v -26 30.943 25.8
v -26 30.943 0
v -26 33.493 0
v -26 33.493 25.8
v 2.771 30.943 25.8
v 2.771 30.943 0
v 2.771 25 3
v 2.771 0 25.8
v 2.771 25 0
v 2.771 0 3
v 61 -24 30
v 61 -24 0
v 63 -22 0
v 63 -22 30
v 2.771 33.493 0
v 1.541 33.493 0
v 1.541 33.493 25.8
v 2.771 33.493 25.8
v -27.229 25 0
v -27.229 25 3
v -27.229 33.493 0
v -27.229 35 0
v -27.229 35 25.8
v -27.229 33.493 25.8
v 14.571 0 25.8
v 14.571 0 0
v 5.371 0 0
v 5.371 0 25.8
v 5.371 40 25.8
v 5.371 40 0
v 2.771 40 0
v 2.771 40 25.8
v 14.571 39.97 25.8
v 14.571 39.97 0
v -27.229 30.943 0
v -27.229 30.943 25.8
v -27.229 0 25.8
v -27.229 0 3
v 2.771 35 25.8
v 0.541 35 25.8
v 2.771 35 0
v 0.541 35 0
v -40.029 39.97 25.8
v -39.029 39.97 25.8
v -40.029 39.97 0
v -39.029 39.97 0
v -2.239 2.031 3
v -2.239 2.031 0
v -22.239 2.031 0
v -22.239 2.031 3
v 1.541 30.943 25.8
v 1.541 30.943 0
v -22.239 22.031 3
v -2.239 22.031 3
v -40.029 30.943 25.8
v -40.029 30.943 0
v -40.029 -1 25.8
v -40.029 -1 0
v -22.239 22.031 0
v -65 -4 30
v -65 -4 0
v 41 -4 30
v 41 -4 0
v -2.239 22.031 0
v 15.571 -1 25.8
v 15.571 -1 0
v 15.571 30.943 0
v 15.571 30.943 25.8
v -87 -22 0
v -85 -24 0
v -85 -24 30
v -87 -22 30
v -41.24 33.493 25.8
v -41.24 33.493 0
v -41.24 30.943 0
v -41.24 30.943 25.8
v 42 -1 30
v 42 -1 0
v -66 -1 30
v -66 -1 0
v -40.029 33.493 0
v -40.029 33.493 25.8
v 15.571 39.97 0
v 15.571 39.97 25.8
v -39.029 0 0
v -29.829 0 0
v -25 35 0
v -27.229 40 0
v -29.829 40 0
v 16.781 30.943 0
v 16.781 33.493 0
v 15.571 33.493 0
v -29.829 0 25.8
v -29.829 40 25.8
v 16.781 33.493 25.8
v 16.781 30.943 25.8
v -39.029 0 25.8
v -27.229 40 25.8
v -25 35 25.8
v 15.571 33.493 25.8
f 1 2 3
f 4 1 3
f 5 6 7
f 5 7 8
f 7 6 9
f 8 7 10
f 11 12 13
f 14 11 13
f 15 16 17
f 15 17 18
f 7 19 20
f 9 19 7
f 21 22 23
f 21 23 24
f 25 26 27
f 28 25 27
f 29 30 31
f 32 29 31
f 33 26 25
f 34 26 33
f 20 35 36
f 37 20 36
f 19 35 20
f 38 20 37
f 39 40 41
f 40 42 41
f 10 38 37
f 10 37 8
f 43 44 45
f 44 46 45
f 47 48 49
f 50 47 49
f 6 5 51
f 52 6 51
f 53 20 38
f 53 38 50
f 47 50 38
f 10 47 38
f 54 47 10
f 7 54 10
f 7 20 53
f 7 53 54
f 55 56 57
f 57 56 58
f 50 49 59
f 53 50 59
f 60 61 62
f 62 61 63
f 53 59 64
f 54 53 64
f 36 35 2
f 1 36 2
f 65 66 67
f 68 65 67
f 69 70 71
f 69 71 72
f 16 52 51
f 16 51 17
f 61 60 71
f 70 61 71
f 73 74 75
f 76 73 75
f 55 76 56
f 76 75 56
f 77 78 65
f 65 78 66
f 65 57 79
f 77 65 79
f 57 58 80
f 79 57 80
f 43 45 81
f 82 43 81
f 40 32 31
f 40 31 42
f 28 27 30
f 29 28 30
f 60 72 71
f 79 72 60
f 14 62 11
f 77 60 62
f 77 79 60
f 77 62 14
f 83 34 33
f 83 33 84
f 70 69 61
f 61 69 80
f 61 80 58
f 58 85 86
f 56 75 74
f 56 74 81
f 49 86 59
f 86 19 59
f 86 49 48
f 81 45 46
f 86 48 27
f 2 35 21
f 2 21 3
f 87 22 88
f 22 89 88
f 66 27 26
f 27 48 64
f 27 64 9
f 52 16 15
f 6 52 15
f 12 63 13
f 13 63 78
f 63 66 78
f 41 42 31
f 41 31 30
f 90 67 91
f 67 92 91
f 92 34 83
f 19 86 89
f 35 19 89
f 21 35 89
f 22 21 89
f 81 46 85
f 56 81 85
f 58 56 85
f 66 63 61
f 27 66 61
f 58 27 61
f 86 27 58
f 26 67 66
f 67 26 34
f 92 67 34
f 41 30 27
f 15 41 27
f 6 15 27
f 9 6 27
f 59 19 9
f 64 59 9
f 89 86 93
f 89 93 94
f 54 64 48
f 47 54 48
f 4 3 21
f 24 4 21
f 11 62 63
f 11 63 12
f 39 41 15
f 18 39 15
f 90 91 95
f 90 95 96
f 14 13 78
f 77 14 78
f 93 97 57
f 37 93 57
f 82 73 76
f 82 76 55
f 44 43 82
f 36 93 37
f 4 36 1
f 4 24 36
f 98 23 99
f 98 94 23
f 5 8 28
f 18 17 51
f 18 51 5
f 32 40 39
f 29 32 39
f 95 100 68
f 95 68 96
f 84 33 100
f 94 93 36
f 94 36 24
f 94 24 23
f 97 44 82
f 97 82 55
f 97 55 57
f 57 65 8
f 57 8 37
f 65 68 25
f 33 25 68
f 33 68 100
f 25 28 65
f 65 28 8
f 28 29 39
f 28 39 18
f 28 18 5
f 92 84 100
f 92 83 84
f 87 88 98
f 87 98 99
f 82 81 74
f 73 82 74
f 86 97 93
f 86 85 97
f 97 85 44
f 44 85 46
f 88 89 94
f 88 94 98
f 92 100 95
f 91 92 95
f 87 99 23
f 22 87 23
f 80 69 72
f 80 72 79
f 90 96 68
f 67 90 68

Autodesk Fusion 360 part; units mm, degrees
sketch "スケッチ1" plane through (0, 0, 0) normal (0, 0, 1) x (1, 0, 0)
  line L0 (-40.0294, 0) -> (-27.2294, 0)
  line L1 (-27.2294, 0) -> (-27.2294, -2.8335)
  line L2 (-27.2294, -2.8335) -> (-40.0294, -2.8335)
  line L3 (-40.0294, -2.8335) -> (-40.0294, 0)
  line L4 (-40.0294, 0) -> (-39.0294, 0)
  line L5 (-39.0294, 0) -> (-39.0294, 39.9696)
  line L6 (-39.0294, 39.9696) -> (-40.0294, 39.9696)
  line L7 (-40.0294, 39.9696) -> (-40.0294, 0)
  line L8 (-27.2294, 0) -> (-28.3294, 0)
  line L9 (-28.3294, 0) -> (-28.3294, 40)
  line L10 (-28.3294, 40) -> (-27.2294, 40)
  line L11 (-27.2294, 40) -> (-27.2294, 0)
  line L12 (-27.2294, 0) -> (2.7706, 0)
  line L13 (2.7706, 0) -> (2.7706, -2.9213)
  line L14 (2.7706, -2.9213) -> (-27.2294, -2.9213)
  line L15 (-27.2294, -2.9213) -> (-27.2294, 0)
  line L16 (-12.2294, 0) -> (-12.2294, -2.9213)
  line L17 (2.7706, 0) -> (2.7706, -2.8335)
  line L18 (15.5706, 0) -> (2.7706, 0)
  line L19 (15.5706, 39.9696) -> (15.5706, 0)
  line L20 (3.8706, 0) -> (3.8706, 40)
  line L21 (14.5706, 39.9696) -> (15.5706, 39.9696)
  line L22 (15.5706, 0) -> (14.5706, 0)
  line L23 (14.5706, 0) -> (14.5706, 39.9696)
  line L24 (15.5706, -2.8335) -> (15.5706, 0)
  line L25 (2.7706, -2.9213) -> (2.7706, 0)
  line L26 (2.7706, 40) -> (2.7706, 0)
  line L27 (2.7706, 0) -> (3.8706, 0)
  line L28 (3.8706, 40) -> (2.7706, 40)
  line L29 (2.7706, -2.8335) -> (15.5706, -2.8335)
  line L30 (-27.2294, 40) -> (-25, 35)
  line L31 (-25, 35) -> (-27.2294, 35)
  line L32 (3.8706, 40) -> (2.7706, 40)
  line L33 (0.5411, 35) -> (2.7706, 35)
  line L34 (2.7706, 40) -> (0.5411, 35)
  dimension "d1" = 12.8
  dimension "d2" = 1
  dimension "d3" = 1.1
  dimension "d4" = 30
sketch "スケッチ2" plane through (0, 0, 0) normal (0, 0, 1) x (1, 0, 0)
  line L0 (-40, 34.6932) -> (-40, 33.4932)
  line L1 (-40, 33.4932) -> (-41.2402, 33.4932)
  line L2 (-41.2402, 33.4932) -> (-41.2402, 30.9431)
  line L3 (-41.2402, 30.9431) -> (-40, 30.9431)
  line L4 (-40, 30.9431) -> (-40, 33.4932)
  line L5 (-26, 34.6932) -> (-26, 33.4932)
  line L6 (-27.2402, 33.4932) -> (-27.2402, 30.9431)
  line L7 (-26, 30.9431) -> (-26, 33.4932)
  line L8 (-26, 33.4932) -> (-27.2402, 33.4932)
  line L9 (-27.2402, 30.9431) -> (-26, 30.9431)
  line L10 (-40, 33.4932) -> (-41.2402, 33.4932)
  line L11 (-40, 30.9431) -> (-40, 33.4932)
  line L12 (-41.2402, 33.4932) -> (-41.2402, 30.9431)
  line L13 (-41.2402, 30.9431) -> (-40, 30.9431)
  line L14 (-27.2402, 33.4932) -> (-27.2402, 30.9431)
  line L15 (-26, 33.4932) -> (-27.2402, 33.4932)
  line L16 (-27.2402, 30.9431) -> (-26, 30.9431)
  line L17 (-26, 34.6932) -> (-26, 33.4932)
  line L18 (-26, 30.9431) -> (-26, 33.4932)
  line L19 (-40, 34.6932) -> (-40, 33.4932)
  line L20 (-12.2294, 0) -> (-12.2294, -2.9213)
  line L21 (2.7813, 33.4932) -> (2.7813, 30.9431)
  line L22 (15.5411, 30.9431) -> (15.5411, 33.4932)
  line L23 (16.7813, 33.4932) -> (16.7813, 30.9431)
  line L24 (1.5411, 34.6932) -> (1.5411, 33.4932)
  line L25 (1.5411, 30.9431) -> (1.5411, 33.4932)
  line L26 (2.7813, 33.4932) -> (2.7813, 30.9431)
  line L27 (15.5411, 33.4932) -> (16.7813, 33.4932)
  line L28 (1.5411, 34.6932) -> (1.5411, 33.4932)
  line L29 (2.7813, 30.9431) -> (1.5411, 30.9431)
  line L30 (2.7813, 30.9431) -> (1.5411, 30.9431)
  line L31 (1.5411, 33.4932) -> (2.7813, 33.4932)
  line L32 (1.5411, 33.4932) -> (2.7813, 33.4932)
  line L33 (15.5411, 34.6932) -> (15.5411, 33.4932)
  line L34 (15.5411, 33.4932) -> (16.7813, 33.4932)
  line L35 (16.7813, 33.4932) -> (16.7813, 30.9431)
  line L36 (16.7813, 30.9431) -> (15.5411, 30.9431)
  line L37 (16.7813, 30.9431) -> (15.5411, 30.9431)
  line L38 (1.5411, 30.9431) -> (1.5411, 33.4932)
  line L39 (15.5411, 34.6932) -> (15.5411, 33.4932)
  line L40 (15.5411, 30.9431) -> (15.5411, 33.4932)
  dimension "d8" = 1.2
  dimension "d9" = 1.2
  dimension "d10" = 1.2
  dimension "d11" = 1.2
extrude "押し出し1" add sketch "スケッチ1" sketch "スケッチ2" along normal blind 25.8 of sketch 2
move_face "面をオフセット1" offset 1.5 1 faces at (-28.3294, 26.6667, 17.2)
move_face "面をオフセット2" offset 1.5 1 faces at (3.8706, 26.6667, 17.2)
sketch "スケッチ3" plane through (0, 0, 0) normal (0, 0, 1) x (1, 0, 0)
  line L0 (-22.2393, 22.0314) -> (-2.2393, 22.0314)
  line L1 (-2.2393, 22.0314) -> (-2.2393, 2.0314)
  line L2 (-2.2393, 2.0314) -> (-22.2393, 2.0314)
  line L3 (-22.2393, 2.0314) -> (-22.2393, 22.0314)
  line L4 (-29, 25) -> (4, 25)
  line L5 (4, 25) -> (4, -2)
  line L6 (4, -2) -> (-29, -2)
  line L7 (-29, -2) -> (-29, 25)
  dimension "d16" = 20
  dimension "d17" = 20
extrude "押し出し2" add sketch "スケッチ3" along normal blind 3
sketch "スケッチ4" plane through (0, 0, 0) normal (0, 0, 1) x (1, 0, 0)
  line L0 (-12, -2) -> (-67, -2)
  line L1 (-67, -2) -> (-67, -4)
  line L2 (-67, -4) -> (-12, -4)
  line L3 (-12, -4) -> (-12, -2)
  line L4 (-67, -2) -> (-65, -4)
  line L5 (-65, -4) -> (-85, -24)
  line L6 (-85, -24) -> (-87, -22)
  line L7 (-87, -22) -> (-67, -2)
  line L8 (61, -24) -> (63, -22)
  line L9 (41, -4) -> (61, -24)
  line L10 (-12, -2) -> (43, -2)
  line L11 (43, -2) -> (41, -4)
  line L12 (63, -22) -> (43, -2)
  line L13 (43, -2) -> (43, -4)
  line L14 (43, -4) -> (-12, -4)
  point P0 (-24, 0)
extrude "押し出し3" add sketch "スケッチ4" along normal blind 30
move_face "面をオフセット3" offset 1 1 faces at (33.8569, -2, 18.6)
